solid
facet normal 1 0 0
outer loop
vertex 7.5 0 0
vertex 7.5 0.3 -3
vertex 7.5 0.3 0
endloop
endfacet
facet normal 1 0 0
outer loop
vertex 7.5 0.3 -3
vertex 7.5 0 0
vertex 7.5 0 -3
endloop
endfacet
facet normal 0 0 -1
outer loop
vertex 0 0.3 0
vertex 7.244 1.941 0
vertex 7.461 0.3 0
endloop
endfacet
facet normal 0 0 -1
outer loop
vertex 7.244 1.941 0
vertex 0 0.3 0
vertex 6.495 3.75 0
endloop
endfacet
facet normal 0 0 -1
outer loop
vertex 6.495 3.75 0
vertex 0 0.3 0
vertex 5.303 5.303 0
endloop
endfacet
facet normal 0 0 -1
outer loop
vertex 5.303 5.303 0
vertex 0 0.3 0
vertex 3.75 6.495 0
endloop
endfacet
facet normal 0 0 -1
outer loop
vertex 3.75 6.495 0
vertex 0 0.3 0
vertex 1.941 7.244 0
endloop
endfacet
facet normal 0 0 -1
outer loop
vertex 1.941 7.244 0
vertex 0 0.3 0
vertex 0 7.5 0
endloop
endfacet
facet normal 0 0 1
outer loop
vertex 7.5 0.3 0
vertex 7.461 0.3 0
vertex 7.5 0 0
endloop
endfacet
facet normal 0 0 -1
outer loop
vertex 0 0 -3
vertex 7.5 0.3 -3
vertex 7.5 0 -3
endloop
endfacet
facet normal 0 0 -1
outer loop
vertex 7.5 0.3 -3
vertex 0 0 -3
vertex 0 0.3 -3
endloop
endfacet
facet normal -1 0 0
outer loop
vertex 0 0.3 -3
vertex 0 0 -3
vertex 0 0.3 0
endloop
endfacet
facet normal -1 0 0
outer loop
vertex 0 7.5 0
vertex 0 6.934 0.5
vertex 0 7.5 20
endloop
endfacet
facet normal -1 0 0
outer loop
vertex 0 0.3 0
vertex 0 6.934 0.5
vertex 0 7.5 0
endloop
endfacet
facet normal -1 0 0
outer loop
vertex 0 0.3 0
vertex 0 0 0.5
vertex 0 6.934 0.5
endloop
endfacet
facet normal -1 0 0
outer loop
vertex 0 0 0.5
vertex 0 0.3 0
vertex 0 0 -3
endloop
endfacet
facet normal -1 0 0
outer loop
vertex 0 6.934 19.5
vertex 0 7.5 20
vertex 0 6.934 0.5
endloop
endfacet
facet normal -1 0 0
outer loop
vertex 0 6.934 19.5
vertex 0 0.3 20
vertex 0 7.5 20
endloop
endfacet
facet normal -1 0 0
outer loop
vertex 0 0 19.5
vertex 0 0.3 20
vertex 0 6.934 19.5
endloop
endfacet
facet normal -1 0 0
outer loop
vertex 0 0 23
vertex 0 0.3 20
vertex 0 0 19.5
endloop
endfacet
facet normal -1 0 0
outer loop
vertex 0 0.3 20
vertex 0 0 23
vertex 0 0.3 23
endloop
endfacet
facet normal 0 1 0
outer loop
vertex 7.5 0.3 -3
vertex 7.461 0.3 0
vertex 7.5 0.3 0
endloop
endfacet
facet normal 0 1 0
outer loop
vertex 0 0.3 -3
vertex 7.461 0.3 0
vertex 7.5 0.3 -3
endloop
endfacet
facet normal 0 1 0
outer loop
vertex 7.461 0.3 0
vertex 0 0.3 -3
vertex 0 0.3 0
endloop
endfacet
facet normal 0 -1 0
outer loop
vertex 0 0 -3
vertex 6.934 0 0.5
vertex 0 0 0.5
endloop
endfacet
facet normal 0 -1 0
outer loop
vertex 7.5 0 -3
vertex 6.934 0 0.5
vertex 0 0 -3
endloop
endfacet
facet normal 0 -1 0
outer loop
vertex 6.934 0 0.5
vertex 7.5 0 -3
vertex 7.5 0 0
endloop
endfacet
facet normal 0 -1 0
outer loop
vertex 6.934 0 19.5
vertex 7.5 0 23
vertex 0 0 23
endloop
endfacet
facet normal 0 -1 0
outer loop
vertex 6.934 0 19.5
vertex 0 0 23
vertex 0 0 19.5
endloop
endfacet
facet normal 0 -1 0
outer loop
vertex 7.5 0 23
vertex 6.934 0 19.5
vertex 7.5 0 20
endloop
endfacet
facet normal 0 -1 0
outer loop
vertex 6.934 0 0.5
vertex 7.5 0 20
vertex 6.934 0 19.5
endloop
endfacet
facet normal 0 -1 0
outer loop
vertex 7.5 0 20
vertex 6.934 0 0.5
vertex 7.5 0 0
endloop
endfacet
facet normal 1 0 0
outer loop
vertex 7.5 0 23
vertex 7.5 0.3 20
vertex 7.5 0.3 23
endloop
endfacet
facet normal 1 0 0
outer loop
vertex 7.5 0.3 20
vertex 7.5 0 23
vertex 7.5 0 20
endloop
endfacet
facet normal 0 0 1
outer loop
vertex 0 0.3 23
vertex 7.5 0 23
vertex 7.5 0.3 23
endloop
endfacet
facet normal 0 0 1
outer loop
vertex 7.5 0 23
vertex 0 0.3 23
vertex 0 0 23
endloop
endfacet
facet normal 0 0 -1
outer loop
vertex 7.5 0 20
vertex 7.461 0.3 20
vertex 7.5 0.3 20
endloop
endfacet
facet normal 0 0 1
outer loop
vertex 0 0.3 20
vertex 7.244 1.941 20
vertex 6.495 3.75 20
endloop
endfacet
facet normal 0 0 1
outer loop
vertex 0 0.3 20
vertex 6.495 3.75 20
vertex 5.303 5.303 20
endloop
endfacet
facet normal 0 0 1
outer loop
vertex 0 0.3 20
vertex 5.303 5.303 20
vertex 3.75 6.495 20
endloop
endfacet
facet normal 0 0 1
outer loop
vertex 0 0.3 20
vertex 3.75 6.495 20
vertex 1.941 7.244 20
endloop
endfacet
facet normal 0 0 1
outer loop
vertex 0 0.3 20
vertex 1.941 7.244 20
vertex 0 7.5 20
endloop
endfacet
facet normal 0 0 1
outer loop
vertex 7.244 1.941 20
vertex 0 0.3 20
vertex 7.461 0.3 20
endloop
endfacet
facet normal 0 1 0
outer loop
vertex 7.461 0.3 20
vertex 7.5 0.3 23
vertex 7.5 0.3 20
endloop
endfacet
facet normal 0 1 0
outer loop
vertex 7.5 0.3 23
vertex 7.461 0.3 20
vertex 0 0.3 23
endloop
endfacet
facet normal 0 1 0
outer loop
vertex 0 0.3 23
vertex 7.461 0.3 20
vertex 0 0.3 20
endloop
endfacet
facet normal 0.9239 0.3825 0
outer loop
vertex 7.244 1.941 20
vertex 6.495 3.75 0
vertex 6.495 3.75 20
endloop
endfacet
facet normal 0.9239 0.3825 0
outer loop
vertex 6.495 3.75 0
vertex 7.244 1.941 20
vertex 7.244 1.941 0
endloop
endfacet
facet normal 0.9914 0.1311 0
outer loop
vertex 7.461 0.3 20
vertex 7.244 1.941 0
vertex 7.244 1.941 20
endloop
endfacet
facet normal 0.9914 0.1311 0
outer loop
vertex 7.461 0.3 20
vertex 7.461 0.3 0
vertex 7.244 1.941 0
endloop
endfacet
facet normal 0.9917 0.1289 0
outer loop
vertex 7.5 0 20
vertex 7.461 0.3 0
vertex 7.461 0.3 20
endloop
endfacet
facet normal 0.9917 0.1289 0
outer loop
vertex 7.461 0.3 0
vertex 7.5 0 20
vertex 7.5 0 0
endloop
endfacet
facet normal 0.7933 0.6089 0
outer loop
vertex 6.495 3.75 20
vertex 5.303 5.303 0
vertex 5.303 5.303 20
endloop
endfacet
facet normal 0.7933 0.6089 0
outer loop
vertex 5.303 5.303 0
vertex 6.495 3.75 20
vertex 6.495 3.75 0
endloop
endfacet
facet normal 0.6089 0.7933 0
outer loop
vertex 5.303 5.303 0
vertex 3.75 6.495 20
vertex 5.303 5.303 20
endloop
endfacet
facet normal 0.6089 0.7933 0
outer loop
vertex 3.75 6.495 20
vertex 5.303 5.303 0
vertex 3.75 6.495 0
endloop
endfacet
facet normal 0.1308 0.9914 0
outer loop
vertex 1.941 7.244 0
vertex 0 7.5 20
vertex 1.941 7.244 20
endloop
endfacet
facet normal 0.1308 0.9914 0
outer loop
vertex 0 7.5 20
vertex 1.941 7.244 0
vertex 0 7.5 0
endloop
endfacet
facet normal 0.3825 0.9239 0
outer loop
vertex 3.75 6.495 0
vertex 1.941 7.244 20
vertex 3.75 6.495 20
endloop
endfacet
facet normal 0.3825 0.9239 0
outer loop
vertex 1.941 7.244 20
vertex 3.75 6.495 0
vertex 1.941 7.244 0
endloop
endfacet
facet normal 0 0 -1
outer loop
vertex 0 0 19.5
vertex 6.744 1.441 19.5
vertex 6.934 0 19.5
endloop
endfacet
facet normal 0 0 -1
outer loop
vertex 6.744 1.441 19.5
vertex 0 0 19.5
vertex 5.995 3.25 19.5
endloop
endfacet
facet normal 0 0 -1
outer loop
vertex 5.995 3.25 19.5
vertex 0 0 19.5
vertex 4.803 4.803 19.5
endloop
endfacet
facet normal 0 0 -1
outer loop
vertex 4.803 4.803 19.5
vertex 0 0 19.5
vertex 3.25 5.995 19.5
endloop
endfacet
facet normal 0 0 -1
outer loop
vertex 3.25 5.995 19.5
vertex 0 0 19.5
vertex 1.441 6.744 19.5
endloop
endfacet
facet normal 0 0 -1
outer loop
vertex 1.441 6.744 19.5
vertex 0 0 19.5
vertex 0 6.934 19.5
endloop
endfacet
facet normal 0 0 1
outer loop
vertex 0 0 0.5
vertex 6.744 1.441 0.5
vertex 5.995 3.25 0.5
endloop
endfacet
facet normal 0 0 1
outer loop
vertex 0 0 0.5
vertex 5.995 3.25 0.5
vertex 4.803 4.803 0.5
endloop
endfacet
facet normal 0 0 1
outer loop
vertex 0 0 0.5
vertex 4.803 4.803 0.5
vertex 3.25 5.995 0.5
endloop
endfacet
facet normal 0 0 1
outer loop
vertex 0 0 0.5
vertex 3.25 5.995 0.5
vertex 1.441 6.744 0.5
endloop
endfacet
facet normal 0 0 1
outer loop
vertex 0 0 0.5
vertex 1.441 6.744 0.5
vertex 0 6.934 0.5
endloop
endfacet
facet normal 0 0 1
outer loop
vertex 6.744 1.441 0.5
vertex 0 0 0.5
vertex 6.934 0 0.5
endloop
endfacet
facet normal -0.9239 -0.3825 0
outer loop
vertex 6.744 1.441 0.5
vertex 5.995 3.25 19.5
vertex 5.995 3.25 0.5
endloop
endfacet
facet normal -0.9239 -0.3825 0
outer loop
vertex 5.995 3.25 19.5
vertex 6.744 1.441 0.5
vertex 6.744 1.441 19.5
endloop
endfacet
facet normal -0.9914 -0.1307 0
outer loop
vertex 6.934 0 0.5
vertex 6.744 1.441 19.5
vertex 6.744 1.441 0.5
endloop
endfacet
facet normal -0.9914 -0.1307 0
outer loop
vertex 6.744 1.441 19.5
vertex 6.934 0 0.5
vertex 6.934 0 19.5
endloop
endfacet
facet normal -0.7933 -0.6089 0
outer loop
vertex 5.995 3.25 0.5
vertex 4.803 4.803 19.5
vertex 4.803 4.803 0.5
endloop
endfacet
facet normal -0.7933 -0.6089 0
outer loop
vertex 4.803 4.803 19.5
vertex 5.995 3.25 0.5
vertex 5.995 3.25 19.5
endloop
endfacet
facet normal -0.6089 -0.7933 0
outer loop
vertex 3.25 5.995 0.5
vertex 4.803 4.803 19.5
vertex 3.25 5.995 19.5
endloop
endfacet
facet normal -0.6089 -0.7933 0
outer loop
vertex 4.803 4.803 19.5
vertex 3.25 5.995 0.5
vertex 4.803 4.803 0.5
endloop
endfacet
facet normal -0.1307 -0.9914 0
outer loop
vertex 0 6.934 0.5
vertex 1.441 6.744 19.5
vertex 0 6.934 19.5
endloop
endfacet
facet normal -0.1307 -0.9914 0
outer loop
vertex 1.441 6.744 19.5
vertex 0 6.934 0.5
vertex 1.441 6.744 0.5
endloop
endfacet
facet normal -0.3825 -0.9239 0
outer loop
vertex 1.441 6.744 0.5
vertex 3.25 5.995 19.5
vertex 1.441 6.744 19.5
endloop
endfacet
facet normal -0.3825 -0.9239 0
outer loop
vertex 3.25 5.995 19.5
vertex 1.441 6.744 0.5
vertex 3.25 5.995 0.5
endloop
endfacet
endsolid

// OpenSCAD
// Customizable Air Conditioner Baffle
// designed by knarfishness for DieselPoweredRobotics
// 07.04.2014

baffle_length = 20;
baffle_radius = 7.5;
baffle_thickness = 0.5;
baffle_endwall_thickness = 0.5;

baffle_bracket_size = 3;
baffle_bracket_thickness = 0.3;



module quarter_pipe()
{
	intersection()
	{
		cube([baffle_radius*2,baffle_radius*2,baffle_length]);
		cylinder(baffle_length,baffle_radius,baffle_radius);
	}
}

module quarter_pipe_inner()
{
	translate([0,0,baffle_endwall_thickness])
	intersection()
	{
		cube([baffle_radius*2,baffle_radius*2,baffle_length-(baffle_endwall_thickness*2)]);
		cylinder(baffle_length-(baffle_endwall_thickness*2),baffle_radius,baffle_radius);
	}
}

module baffle_wall()
{
	difference()
	{
		quarter_pipe();
		translate([-baffle_thickness,-baffle_thickness,0])
		quarter_pipe_inner();
		
	}
}

module bracket_piece()
{
	cube([baffle_radius,baffle_bracket_thickness,baffle_bracket_size]);
}

module brackets()
{
	translate([0,0,-baffle_bracket_size])
	bracket_piece();
	
	translate([0,0,baffle_length])
	bracket_piece();
}

brackets();
baffle_wall();
